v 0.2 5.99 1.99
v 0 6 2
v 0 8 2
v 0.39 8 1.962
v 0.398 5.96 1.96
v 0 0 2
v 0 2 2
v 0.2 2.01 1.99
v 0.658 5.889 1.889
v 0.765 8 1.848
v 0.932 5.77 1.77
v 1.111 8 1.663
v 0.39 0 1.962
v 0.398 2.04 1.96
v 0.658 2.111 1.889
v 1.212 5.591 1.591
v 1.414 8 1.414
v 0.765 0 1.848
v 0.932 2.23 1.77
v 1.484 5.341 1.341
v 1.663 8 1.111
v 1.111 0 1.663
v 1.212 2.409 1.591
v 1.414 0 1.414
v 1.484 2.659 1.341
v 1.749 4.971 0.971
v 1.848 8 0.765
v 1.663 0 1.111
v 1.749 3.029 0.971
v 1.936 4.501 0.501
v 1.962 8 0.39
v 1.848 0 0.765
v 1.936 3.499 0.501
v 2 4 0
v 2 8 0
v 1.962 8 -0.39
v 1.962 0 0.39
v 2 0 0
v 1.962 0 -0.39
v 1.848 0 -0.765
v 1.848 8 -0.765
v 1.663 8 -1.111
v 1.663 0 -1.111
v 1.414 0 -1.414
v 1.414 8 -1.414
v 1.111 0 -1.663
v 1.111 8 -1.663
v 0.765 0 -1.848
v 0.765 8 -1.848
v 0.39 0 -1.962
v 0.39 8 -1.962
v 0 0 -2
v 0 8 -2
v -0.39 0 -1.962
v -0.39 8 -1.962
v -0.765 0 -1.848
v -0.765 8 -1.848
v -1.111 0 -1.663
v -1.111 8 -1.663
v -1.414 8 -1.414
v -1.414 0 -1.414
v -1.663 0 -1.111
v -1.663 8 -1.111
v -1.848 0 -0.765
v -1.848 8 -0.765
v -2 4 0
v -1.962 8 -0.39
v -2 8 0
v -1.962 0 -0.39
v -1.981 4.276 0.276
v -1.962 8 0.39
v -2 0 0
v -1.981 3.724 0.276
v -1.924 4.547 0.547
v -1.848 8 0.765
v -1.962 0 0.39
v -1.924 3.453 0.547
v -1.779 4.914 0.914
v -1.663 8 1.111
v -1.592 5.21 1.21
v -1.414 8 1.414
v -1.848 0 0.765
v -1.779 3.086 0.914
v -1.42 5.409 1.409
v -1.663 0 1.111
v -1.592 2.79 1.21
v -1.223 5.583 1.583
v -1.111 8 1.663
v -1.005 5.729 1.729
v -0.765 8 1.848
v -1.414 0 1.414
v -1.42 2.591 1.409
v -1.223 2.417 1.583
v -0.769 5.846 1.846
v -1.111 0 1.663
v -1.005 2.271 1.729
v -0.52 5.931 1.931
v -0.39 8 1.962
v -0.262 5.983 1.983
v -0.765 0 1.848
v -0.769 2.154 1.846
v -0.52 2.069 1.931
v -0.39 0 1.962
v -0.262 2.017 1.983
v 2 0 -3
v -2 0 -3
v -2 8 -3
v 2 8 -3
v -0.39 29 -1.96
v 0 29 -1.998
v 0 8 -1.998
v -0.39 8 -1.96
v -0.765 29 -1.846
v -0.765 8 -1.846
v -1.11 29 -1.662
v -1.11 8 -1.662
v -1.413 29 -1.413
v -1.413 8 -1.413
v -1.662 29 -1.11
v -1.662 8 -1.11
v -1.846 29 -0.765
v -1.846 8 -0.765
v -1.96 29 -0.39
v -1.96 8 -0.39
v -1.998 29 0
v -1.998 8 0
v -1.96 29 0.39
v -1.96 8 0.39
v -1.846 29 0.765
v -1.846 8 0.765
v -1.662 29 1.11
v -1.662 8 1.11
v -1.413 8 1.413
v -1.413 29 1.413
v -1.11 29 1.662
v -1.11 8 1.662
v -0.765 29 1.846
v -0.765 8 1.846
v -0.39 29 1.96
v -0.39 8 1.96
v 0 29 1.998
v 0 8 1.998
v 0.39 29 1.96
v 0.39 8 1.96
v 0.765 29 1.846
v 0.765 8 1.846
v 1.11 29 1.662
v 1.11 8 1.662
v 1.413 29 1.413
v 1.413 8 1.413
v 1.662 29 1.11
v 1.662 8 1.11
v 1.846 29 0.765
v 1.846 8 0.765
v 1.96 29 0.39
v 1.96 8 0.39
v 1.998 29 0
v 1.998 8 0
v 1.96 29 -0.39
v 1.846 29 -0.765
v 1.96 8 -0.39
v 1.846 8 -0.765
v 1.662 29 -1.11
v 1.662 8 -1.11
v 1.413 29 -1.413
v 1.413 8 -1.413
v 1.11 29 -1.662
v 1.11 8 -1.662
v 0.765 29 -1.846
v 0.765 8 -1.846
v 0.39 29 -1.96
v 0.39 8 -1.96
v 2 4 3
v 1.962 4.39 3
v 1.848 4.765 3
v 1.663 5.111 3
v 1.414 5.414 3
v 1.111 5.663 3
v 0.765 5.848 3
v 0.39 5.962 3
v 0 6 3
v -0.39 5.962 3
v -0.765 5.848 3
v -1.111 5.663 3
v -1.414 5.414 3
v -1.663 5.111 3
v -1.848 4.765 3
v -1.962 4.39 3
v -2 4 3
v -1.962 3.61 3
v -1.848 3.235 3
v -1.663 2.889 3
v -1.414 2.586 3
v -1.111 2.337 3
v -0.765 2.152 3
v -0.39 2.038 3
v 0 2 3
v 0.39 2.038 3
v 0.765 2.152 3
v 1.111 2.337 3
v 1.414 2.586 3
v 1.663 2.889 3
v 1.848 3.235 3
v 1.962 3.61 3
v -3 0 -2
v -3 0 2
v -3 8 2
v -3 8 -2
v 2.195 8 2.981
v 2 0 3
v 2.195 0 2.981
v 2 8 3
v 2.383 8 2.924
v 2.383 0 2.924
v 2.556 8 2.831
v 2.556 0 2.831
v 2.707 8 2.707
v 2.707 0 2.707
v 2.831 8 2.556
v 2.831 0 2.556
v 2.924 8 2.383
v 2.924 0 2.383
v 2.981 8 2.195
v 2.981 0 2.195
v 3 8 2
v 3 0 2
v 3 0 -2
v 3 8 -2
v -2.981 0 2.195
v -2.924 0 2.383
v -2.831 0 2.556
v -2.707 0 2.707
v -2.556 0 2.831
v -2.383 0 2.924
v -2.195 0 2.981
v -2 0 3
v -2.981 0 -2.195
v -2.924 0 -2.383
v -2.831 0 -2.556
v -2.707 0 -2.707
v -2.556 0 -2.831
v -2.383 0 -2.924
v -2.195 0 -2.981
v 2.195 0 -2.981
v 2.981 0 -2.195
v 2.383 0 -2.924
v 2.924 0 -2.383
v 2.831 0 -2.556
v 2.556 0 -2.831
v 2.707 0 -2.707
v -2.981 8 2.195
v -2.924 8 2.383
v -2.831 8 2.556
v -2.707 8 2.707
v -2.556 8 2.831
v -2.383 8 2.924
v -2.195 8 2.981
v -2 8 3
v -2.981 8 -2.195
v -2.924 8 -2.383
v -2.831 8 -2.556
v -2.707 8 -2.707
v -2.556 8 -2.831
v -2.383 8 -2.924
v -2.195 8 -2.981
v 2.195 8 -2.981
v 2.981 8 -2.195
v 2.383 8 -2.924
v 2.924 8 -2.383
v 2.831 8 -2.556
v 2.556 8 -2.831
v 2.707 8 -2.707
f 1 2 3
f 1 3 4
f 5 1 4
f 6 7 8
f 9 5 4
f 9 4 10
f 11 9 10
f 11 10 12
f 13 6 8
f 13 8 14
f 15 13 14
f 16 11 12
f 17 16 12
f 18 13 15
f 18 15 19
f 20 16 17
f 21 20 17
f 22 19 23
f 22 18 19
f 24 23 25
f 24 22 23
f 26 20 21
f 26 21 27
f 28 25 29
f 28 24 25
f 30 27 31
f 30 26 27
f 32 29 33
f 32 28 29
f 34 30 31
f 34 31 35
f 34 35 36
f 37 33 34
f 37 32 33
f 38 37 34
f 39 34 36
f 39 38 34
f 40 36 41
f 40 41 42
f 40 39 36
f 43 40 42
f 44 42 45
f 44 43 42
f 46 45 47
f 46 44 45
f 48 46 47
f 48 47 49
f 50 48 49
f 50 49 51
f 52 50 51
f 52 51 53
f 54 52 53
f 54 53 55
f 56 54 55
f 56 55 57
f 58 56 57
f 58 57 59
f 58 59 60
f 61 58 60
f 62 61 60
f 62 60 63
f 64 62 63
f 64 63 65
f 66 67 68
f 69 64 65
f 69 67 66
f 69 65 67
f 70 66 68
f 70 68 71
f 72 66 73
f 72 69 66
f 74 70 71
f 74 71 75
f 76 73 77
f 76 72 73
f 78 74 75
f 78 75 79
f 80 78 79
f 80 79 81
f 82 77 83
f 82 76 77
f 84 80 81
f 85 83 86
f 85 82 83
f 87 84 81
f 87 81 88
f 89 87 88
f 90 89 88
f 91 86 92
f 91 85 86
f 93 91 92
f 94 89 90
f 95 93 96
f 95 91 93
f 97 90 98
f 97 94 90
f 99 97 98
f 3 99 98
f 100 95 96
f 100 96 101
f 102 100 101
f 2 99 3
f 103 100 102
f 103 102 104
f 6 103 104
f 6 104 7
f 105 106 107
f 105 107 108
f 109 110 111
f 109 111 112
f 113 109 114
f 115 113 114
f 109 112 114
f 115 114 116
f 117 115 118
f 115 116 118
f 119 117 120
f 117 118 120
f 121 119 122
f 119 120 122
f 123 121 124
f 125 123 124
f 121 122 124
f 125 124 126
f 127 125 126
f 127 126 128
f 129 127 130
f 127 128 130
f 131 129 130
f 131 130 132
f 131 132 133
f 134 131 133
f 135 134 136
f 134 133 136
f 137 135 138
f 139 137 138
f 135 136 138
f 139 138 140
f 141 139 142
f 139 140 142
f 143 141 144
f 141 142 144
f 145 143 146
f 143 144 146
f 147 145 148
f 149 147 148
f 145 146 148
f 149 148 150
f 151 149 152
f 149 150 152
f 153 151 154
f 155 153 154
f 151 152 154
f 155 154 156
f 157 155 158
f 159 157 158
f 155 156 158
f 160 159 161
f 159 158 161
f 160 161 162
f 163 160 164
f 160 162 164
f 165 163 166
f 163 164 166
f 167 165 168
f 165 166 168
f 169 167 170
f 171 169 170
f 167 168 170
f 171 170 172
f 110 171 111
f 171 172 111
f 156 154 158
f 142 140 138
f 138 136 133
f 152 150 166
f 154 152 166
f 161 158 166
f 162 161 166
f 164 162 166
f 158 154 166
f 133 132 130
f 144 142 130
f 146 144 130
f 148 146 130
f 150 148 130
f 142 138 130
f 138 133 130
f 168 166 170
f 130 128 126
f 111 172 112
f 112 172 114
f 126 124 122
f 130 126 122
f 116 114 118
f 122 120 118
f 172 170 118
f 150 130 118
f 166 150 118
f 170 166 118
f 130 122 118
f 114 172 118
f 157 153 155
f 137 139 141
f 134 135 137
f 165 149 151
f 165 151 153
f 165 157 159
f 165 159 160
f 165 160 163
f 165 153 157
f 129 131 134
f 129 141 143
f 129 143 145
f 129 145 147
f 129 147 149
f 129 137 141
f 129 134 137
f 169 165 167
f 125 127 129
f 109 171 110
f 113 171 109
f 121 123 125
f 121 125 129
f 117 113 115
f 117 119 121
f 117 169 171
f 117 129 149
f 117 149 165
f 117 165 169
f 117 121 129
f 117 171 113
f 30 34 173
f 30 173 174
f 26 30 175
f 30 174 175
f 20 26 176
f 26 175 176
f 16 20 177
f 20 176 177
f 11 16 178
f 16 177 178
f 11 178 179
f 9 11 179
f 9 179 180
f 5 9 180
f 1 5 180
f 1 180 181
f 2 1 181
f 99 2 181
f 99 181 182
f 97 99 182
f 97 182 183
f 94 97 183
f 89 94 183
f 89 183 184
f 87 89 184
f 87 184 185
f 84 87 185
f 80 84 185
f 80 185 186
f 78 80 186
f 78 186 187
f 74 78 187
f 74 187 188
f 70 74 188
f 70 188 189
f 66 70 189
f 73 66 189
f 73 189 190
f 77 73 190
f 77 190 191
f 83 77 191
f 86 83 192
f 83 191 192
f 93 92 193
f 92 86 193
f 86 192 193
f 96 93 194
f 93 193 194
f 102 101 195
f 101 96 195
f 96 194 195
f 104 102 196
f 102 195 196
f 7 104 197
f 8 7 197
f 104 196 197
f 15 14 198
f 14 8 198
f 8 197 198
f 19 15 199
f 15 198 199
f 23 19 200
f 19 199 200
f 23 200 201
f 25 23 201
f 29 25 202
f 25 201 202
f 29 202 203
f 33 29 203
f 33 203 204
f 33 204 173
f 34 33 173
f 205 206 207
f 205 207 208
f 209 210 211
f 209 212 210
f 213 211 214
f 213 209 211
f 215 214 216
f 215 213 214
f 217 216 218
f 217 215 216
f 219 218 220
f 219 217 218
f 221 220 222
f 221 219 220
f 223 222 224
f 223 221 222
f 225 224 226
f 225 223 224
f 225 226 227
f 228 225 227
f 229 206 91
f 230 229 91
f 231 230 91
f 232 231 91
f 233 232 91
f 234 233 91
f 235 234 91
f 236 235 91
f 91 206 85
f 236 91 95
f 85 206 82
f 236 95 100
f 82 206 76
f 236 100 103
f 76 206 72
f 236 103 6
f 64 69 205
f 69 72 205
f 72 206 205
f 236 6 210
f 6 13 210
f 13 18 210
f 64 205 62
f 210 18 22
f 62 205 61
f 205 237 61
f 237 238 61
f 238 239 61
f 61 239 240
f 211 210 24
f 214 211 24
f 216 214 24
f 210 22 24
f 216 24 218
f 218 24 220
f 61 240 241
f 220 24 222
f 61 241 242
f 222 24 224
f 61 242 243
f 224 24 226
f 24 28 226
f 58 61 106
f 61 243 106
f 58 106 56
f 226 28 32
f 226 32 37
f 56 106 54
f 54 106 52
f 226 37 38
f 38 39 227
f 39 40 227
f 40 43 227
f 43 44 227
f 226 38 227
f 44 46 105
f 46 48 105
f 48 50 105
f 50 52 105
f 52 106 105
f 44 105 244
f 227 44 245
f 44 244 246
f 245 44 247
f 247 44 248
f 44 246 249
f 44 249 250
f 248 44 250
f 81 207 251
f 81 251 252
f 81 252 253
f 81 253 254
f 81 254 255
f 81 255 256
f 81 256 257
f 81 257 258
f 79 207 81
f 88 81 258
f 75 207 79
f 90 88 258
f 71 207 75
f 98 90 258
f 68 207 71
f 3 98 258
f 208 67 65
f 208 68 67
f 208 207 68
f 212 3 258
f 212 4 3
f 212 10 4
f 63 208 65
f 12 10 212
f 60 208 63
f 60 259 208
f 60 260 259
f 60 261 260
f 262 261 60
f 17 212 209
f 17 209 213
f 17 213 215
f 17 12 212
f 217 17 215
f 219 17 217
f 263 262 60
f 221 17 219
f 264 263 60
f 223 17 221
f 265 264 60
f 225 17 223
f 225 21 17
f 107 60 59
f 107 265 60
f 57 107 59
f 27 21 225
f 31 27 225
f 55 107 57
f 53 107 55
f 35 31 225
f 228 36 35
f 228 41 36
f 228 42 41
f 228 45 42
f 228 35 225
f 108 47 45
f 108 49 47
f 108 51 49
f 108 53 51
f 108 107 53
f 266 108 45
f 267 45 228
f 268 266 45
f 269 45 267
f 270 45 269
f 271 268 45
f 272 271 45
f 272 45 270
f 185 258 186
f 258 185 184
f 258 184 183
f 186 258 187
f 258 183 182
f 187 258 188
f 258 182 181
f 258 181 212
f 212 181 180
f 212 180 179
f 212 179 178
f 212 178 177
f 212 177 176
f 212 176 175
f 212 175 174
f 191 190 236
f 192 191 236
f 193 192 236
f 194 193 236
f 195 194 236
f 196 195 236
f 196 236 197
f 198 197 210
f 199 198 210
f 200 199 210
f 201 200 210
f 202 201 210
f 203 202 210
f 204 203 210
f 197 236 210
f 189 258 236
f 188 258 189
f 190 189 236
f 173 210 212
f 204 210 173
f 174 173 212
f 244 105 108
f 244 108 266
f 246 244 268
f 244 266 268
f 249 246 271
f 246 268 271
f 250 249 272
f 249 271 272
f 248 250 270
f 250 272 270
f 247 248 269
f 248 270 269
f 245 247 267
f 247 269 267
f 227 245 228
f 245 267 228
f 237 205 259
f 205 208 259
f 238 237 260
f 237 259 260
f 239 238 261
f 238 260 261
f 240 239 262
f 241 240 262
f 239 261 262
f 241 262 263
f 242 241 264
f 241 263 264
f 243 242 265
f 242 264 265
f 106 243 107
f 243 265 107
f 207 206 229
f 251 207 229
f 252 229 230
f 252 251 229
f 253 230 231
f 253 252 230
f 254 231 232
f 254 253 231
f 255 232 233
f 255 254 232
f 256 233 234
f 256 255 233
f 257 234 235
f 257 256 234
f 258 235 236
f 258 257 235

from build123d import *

# Parameters (mm, degrees)
SKETCH1_W           = 6
SKETCH1_H           = 6
SKETCH1_R           = 2
BOSS_EXTRUDE1_DEPTH = 8
SKETCH2_R           = 1.99840551
BOSS_EXTRUDE2_DEPTH = 21
SKETCH3_R           = 2
CUT_EXTRUDE1_DEPTH  = 3
FILLET1_R           = 1


with BuildPart() as part:
    # Sketch1 → Boss-Extrude1 (new body)
    with BuildSketch(Plane(origin=(0, 0, 0), x_dir=(1, 0, 0), z_dir=(0, 1, 0))):
        Rectangle(SKETCH1_W, SKETCH1_H)
        with Locations(Location((0, 0, 0), (0, 0, 270))):
            Circle(SKETCH1_R, mode=Mode.SUBTRACT)
    extrude(amount=BOSS_EXTRUDE1_DEPTH)

    # Sketch3 → Cut-Extrude1 (cut)
    with BuildSketch(Plane.XY.offset(3)):
        with Locations((0, 4)):
            Circle(SKETCH3_R)
    extrude(amount=-CUT_EXTRUDE1_DEPTH, mode=Mode.SUBTRACT)

    # Fillet1
    fillet1_edges = [part.edges().sort_by_distance(p)[0] for p in [
        (-3, 4, -3),
        (3, 4, -3),
        (3, 4, 3),
        (-3, 4, 3),
    ]]
    fillet(fillet1_edges, radius=FILLET1_R - 0.0001)  # a hair under: the kernel refuses the full size


with BuildPart() as body_2:
    # Sketch2 → Boss-Extrude2 (new body)
    with BuildSketch(Plane(origin=(0, 8, 0), x_dir=(1, 0, 0), z_dir=(0, 1, 0))):
        with Locations(Location((0, 0, 0), (0, 0, 90))):
            Circle(SKETCH2_R)
    extrude(amount=BOSS_EXTRUDE2_DEPTH)


solid = Compound([part.part, body_2.part])
